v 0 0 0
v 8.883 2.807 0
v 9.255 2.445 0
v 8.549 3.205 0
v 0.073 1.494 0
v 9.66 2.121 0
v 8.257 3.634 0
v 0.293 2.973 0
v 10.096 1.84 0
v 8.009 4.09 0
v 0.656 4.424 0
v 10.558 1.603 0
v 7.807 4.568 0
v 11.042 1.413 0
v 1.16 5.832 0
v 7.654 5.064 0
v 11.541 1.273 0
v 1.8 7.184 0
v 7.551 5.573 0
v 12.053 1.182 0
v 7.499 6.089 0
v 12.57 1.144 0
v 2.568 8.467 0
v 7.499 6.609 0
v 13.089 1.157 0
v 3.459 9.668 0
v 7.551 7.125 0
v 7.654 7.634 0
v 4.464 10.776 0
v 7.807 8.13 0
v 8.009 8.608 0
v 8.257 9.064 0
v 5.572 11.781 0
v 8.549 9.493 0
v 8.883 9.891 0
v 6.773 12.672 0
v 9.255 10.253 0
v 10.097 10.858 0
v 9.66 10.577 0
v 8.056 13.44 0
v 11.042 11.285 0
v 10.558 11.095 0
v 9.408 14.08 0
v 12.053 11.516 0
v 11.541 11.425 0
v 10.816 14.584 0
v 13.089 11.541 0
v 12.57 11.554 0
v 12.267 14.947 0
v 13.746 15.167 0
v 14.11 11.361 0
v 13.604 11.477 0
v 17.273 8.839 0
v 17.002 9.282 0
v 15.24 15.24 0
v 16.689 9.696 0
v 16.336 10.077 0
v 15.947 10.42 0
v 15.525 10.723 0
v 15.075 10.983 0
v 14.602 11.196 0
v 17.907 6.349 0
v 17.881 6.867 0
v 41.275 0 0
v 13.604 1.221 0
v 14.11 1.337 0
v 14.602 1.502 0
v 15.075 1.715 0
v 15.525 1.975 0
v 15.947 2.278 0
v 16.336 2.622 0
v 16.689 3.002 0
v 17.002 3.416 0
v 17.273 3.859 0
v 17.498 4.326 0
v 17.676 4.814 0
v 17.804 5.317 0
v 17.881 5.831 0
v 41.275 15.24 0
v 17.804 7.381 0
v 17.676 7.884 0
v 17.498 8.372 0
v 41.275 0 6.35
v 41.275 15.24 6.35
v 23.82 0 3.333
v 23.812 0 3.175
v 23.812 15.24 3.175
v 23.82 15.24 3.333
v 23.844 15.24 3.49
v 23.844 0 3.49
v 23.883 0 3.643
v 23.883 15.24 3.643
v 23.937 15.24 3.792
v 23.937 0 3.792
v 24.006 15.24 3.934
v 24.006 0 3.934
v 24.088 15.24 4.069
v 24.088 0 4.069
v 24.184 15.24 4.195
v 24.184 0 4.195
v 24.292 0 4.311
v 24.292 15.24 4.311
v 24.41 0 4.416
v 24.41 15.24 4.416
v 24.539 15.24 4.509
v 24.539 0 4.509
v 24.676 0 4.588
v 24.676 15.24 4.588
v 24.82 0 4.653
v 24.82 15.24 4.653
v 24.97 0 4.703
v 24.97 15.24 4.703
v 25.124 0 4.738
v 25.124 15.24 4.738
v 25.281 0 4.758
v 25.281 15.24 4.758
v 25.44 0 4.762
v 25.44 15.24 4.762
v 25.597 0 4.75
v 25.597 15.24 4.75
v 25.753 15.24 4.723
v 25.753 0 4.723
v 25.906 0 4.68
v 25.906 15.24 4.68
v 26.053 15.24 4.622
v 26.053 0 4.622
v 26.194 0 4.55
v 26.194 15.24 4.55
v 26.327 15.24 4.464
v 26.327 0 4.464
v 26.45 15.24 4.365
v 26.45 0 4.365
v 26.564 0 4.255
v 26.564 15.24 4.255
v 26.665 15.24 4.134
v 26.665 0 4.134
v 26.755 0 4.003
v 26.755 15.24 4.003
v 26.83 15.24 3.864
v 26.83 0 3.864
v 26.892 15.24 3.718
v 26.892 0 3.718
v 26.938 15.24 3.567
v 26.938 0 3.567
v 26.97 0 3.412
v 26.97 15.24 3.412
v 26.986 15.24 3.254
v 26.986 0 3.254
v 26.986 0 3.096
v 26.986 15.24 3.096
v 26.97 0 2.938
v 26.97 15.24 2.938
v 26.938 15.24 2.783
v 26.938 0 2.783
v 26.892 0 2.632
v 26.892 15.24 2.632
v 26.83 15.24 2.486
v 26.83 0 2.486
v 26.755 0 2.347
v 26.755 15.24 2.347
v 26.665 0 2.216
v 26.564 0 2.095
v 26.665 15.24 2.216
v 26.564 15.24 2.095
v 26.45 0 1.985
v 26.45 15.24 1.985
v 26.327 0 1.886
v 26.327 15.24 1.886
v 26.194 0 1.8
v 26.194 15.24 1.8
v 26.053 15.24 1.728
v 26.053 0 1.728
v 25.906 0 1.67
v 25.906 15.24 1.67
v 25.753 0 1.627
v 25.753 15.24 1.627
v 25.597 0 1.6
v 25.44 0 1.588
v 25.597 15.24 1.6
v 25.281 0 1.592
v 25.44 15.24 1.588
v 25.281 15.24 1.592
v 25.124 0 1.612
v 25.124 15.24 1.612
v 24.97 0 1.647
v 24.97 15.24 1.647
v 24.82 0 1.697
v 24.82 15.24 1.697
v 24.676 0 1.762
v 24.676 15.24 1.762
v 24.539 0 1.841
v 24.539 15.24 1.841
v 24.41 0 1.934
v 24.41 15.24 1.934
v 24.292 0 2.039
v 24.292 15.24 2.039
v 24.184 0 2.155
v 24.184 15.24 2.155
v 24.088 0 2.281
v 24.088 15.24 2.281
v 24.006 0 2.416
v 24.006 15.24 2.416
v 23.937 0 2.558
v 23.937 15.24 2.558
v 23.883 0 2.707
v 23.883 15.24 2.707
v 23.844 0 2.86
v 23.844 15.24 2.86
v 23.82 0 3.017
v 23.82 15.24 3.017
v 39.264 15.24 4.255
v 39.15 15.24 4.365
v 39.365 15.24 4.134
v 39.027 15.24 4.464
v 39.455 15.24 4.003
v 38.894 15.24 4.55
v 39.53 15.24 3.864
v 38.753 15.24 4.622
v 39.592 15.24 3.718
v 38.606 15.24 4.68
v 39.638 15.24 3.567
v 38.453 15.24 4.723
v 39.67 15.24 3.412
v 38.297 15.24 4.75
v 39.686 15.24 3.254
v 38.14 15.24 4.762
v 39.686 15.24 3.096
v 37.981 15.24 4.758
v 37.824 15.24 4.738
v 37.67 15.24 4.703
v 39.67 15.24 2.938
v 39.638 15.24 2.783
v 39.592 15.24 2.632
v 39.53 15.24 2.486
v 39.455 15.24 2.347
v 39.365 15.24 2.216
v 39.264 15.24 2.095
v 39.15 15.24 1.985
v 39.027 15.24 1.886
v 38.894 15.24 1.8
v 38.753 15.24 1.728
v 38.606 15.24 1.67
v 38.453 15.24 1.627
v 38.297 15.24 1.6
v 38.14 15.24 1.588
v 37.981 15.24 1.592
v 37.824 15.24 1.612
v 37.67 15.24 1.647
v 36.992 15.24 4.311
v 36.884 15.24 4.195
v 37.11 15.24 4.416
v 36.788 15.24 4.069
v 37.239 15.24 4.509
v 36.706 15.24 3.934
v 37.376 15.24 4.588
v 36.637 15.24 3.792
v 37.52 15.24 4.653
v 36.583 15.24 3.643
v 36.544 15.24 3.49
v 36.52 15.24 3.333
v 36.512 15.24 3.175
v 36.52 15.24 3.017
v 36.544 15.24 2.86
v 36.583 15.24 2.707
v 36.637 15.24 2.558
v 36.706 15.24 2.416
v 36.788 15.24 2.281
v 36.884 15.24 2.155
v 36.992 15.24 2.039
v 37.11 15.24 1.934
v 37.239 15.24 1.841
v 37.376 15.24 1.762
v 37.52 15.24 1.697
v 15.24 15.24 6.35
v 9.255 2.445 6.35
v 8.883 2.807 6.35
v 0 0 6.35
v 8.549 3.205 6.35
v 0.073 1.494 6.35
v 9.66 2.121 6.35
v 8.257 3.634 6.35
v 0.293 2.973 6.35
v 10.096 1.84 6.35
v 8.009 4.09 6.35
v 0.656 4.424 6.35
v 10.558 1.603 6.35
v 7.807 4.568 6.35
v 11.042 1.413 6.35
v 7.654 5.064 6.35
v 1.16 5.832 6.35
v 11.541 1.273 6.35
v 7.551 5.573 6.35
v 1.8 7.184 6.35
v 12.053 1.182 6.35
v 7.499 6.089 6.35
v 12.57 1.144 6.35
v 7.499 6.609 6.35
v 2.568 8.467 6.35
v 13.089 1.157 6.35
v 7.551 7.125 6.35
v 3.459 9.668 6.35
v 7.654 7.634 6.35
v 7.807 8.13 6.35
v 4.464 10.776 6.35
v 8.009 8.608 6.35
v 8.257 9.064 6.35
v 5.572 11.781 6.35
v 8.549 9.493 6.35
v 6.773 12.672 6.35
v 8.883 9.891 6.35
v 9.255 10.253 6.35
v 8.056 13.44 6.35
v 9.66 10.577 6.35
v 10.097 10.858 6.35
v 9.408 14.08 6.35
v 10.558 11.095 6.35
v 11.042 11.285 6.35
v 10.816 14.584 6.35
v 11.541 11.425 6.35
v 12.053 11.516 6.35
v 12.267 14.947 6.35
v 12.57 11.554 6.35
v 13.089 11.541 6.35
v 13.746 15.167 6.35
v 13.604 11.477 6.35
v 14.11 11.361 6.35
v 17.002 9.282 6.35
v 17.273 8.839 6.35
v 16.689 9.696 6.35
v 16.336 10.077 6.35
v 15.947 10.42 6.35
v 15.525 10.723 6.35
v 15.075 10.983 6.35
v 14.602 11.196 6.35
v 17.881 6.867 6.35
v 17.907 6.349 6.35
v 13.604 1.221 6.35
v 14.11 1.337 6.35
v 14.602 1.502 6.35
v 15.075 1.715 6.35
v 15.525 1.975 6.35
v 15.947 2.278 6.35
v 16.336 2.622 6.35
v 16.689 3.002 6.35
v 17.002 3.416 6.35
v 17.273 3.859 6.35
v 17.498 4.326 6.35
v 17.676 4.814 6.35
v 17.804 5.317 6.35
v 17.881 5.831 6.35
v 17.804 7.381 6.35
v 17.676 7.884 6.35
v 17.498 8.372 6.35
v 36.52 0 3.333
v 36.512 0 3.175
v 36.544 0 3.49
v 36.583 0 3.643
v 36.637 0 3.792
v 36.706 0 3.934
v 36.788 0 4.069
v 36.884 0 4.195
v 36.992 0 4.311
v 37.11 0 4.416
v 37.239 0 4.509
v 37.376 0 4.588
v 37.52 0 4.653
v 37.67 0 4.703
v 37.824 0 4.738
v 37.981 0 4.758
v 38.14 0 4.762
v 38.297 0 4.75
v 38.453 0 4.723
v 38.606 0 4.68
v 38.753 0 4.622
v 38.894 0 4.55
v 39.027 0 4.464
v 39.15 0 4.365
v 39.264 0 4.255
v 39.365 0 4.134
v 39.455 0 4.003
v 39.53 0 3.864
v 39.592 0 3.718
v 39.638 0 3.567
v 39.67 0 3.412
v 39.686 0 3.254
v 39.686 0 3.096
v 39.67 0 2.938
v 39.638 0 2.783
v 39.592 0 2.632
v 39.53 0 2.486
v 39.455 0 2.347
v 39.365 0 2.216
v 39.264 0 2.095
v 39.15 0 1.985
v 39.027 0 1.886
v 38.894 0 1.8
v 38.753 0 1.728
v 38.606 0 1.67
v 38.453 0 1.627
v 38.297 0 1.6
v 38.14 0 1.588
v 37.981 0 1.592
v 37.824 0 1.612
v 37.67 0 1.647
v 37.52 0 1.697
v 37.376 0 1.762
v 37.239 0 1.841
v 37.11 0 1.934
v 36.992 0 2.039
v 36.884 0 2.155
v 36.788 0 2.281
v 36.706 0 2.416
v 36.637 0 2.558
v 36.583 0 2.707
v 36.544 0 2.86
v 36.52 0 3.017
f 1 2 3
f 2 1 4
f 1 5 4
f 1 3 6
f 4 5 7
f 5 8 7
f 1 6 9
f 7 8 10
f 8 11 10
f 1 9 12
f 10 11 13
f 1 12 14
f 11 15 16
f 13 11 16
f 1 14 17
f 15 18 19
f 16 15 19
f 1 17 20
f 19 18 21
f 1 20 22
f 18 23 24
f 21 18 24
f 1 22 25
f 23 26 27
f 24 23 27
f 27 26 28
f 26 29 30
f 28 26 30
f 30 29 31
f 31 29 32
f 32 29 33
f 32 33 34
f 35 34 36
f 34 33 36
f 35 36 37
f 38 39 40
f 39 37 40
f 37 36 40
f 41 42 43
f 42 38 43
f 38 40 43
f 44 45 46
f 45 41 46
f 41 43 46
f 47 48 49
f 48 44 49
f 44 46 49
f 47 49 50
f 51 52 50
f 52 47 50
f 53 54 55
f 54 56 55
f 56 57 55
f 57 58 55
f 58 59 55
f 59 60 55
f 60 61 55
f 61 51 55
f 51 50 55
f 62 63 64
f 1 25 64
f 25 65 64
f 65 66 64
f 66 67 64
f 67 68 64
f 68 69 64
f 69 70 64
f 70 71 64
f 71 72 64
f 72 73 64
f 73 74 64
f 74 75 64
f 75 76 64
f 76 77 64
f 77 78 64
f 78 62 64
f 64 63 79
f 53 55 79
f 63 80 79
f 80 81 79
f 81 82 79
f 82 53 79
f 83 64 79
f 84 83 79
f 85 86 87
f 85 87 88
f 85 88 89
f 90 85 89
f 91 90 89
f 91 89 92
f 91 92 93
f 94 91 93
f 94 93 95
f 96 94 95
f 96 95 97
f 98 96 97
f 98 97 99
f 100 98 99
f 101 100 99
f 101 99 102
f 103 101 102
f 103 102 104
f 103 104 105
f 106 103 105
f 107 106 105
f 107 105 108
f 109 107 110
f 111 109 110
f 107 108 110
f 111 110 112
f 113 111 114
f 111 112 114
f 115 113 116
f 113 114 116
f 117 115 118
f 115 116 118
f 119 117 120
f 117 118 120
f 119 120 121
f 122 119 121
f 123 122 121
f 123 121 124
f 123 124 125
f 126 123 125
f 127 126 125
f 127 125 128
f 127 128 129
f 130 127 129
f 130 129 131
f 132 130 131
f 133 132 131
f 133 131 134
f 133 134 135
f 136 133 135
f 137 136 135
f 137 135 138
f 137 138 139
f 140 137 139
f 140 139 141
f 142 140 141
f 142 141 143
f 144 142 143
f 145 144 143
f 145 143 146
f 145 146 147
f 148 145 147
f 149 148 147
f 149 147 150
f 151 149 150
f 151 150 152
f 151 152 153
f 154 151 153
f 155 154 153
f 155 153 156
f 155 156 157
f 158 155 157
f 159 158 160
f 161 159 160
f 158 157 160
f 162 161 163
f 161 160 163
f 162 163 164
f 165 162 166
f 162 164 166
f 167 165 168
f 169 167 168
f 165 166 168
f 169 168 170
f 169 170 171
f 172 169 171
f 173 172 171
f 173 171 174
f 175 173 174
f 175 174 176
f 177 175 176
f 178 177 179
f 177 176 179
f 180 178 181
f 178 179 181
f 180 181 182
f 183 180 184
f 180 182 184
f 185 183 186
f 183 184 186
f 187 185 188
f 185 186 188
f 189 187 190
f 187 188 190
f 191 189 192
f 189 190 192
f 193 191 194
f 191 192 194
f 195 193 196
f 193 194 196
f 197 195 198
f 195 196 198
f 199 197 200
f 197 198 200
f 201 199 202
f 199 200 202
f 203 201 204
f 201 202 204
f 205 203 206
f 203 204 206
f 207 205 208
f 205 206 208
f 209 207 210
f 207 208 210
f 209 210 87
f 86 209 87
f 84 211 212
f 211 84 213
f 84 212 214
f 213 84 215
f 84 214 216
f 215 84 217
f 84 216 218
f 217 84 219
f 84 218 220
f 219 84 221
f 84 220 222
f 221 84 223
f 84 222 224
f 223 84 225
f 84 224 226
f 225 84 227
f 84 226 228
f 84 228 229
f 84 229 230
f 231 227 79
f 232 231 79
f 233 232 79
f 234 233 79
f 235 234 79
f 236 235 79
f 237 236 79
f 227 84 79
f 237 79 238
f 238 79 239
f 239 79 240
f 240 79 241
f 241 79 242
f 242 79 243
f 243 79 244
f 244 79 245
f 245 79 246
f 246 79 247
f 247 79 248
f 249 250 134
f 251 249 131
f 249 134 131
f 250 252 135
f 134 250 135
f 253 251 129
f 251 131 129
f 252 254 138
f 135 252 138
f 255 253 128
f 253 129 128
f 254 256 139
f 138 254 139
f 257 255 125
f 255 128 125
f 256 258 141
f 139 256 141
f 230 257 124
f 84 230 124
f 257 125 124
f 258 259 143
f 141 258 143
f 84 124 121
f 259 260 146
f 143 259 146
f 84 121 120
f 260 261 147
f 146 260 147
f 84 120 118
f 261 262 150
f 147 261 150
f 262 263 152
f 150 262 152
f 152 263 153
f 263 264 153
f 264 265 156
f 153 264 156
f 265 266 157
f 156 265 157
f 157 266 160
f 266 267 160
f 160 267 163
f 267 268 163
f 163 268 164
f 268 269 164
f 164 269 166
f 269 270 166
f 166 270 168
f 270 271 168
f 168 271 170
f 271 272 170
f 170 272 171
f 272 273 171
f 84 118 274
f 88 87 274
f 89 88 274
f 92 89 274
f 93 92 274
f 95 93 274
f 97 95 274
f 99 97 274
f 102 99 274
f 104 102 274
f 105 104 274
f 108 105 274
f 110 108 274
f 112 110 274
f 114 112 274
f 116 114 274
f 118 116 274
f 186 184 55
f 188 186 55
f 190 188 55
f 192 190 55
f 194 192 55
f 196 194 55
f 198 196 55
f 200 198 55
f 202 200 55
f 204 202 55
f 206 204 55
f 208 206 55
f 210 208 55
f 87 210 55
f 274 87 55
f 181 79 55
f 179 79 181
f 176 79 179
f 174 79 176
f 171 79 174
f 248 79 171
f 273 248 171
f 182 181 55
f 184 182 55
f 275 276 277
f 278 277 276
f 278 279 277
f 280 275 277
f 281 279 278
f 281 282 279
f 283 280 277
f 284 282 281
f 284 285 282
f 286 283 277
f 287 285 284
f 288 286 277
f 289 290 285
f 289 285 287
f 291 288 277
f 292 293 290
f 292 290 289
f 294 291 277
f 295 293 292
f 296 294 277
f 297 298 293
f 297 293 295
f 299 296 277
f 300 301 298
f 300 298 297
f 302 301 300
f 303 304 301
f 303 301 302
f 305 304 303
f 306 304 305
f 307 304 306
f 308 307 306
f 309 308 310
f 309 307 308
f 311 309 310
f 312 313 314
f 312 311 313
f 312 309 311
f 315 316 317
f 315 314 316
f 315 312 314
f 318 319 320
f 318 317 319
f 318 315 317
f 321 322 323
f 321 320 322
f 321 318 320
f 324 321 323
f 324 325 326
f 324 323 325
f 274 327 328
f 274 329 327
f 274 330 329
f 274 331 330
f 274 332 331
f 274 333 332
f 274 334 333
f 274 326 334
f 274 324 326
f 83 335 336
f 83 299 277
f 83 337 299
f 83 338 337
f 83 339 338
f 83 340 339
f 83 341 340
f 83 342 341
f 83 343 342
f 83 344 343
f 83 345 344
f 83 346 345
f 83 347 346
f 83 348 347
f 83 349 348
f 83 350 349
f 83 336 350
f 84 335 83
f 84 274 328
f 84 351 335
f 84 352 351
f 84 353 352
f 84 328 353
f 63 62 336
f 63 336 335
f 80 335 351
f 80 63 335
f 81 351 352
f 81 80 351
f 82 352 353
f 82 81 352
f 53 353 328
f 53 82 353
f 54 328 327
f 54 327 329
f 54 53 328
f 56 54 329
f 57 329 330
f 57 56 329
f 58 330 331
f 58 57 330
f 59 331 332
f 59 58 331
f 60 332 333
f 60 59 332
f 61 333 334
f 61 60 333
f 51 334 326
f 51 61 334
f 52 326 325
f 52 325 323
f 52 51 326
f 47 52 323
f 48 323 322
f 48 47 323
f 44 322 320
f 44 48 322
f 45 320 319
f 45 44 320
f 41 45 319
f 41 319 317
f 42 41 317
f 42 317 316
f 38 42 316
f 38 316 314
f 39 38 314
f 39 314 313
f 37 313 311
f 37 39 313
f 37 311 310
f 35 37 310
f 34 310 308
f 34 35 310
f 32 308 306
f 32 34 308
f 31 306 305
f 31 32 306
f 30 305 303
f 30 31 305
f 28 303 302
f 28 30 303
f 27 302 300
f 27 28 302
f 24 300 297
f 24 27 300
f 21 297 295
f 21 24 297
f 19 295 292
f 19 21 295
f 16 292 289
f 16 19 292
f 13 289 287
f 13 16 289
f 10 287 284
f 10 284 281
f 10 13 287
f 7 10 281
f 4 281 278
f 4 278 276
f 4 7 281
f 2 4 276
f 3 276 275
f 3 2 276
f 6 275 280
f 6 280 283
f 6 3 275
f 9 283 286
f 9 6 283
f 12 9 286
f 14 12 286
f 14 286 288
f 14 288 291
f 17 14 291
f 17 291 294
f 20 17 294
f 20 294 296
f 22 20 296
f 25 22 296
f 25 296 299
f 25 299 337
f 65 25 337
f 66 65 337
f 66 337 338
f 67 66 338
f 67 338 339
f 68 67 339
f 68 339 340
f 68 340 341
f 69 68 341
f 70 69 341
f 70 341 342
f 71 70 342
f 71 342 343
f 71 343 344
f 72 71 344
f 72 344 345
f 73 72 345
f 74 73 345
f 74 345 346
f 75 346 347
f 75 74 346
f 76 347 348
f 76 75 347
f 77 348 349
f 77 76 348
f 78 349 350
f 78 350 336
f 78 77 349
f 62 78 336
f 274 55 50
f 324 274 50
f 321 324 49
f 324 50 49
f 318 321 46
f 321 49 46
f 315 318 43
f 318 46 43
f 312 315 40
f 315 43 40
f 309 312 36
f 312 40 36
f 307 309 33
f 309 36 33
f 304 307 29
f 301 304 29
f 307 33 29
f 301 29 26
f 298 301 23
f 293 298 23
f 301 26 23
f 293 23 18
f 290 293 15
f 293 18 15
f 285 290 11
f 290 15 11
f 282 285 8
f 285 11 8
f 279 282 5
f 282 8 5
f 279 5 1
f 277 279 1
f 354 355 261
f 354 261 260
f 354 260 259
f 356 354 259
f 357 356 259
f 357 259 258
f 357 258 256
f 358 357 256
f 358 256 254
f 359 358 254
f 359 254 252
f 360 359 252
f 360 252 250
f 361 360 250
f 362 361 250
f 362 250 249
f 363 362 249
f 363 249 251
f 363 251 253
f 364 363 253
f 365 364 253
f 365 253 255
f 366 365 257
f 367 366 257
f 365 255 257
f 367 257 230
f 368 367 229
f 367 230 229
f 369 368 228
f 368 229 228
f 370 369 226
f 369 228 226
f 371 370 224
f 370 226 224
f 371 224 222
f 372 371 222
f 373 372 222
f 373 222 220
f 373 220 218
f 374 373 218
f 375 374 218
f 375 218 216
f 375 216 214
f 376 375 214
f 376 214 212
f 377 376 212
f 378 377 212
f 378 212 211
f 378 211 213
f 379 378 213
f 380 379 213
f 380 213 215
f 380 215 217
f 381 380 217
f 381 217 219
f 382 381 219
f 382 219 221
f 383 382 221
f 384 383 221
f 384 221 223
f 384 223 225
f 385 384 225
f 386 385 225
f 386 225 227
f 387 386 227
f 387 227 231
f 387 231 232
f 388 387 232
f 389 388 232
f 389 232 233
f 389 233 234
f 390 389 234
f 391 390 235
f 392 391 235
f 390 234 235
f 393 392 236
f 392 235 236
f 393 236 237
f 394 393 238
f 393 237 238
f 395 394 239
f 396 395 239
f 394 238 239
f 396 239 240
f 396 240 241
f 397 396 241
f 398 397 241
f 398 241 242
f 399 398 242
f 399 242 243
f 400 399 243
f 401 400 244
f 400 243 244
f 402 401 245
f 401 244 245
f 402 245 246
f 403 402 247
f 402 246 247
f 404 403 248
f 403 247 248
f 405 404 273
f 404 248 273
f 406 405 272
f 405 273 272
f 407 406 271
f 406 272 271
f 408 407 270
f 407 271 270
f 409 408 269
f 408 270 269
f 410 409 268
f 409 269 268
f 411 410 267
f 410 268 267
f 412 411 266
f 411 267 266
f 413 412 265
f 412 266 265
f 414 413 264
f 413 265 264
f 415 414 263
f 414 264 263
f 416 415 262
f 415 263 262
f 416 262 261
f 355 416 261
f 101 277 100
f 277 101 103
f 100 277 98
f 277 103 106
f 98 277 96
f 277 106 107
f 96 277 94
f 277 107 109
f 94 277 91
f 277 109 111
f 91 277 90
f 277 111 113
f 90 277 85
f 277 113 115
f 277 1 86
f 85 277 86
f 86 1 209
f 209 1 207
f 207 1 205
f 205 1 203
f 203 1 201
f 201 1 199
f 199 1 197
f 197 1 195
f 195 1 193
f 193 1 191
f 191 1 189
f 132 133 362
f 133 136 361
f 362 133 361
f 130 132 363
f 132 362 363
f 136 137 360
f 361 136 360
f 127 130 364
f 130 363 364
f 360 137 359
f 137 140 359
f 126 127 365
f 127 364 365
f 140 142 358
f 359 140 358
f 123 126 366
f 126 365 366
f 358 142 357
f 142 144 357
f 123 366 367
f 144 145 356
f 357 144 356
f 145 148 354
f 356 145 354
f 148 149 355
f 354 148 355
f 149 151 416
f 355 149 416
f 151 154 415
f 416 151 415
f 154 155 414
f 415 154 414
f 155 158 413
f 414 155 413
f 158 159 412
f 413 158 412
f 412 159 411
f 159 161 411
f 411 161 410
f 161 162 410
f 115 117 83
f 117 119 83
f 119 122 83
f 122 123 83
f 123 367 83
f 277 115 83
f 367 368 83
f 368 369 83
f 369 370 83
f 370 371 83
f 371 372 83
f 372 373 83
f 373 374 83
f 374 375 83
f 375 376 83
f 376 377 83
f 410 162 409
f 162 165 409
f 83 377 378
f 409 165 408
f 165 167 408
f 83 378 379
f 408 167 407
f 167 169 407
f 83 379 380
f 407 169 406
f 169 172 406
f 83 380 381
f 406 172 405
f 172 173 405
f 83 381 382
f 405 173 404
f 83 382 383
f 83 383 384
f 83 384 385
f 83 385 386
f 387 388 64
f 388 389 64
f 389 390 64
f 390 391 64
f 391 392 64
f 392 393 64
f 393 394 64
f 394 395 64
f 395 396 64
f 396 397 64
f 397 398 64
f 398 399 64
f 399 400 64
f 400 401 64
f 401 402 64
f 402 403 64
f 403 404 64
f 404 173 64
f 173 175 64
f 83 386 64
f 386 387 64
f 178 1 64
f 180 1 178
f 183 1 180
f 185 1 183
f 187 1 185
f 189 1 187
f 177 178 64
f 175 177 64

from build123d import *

# Parameters (mm, degrees)
F0_R     = 5.207
F1_DEPTH = 6.35
F3_D     = 3.175


with BuildPart() as f1:
    # F0 (on Top) → F1 (new body)
    with BuildSketch(Plane.XY):
        with BuildLine():
            ThreePointArc((15.24, 15.24), (26.0163073453, 10.7763073453), (30.48, 0))
            Line((30.48, 0), (41.275, 0))
            Line((41.275, 0), (41.275, 15.24))
            Line((41.275, 15.24), (15.24, 15.24))
        make_face()
        with BuildLine():
            ThreePointArc((15.24, 15.24), (4.4636926547, 10.7763073453), (0, 0))
            Line((0, 0), (30.48, 0))
            ThreePointArc((30.48, 0), (26.0163073453, 10.7763073453), (15.24, 15.24))
        make_face()
        with Locations((12.7, 6.3490347266)):
            Circle(F0_R, mode=Mode.SUBTRACT)
    extrude(amount=F1_DEPTH)

    # F3 (through all)
    with Locations(Plane.XZ):
        with Locations((25.4, 3.175), (38.1, 3.175)):
            Hole(F3_D / 2)


solid = f1.part
